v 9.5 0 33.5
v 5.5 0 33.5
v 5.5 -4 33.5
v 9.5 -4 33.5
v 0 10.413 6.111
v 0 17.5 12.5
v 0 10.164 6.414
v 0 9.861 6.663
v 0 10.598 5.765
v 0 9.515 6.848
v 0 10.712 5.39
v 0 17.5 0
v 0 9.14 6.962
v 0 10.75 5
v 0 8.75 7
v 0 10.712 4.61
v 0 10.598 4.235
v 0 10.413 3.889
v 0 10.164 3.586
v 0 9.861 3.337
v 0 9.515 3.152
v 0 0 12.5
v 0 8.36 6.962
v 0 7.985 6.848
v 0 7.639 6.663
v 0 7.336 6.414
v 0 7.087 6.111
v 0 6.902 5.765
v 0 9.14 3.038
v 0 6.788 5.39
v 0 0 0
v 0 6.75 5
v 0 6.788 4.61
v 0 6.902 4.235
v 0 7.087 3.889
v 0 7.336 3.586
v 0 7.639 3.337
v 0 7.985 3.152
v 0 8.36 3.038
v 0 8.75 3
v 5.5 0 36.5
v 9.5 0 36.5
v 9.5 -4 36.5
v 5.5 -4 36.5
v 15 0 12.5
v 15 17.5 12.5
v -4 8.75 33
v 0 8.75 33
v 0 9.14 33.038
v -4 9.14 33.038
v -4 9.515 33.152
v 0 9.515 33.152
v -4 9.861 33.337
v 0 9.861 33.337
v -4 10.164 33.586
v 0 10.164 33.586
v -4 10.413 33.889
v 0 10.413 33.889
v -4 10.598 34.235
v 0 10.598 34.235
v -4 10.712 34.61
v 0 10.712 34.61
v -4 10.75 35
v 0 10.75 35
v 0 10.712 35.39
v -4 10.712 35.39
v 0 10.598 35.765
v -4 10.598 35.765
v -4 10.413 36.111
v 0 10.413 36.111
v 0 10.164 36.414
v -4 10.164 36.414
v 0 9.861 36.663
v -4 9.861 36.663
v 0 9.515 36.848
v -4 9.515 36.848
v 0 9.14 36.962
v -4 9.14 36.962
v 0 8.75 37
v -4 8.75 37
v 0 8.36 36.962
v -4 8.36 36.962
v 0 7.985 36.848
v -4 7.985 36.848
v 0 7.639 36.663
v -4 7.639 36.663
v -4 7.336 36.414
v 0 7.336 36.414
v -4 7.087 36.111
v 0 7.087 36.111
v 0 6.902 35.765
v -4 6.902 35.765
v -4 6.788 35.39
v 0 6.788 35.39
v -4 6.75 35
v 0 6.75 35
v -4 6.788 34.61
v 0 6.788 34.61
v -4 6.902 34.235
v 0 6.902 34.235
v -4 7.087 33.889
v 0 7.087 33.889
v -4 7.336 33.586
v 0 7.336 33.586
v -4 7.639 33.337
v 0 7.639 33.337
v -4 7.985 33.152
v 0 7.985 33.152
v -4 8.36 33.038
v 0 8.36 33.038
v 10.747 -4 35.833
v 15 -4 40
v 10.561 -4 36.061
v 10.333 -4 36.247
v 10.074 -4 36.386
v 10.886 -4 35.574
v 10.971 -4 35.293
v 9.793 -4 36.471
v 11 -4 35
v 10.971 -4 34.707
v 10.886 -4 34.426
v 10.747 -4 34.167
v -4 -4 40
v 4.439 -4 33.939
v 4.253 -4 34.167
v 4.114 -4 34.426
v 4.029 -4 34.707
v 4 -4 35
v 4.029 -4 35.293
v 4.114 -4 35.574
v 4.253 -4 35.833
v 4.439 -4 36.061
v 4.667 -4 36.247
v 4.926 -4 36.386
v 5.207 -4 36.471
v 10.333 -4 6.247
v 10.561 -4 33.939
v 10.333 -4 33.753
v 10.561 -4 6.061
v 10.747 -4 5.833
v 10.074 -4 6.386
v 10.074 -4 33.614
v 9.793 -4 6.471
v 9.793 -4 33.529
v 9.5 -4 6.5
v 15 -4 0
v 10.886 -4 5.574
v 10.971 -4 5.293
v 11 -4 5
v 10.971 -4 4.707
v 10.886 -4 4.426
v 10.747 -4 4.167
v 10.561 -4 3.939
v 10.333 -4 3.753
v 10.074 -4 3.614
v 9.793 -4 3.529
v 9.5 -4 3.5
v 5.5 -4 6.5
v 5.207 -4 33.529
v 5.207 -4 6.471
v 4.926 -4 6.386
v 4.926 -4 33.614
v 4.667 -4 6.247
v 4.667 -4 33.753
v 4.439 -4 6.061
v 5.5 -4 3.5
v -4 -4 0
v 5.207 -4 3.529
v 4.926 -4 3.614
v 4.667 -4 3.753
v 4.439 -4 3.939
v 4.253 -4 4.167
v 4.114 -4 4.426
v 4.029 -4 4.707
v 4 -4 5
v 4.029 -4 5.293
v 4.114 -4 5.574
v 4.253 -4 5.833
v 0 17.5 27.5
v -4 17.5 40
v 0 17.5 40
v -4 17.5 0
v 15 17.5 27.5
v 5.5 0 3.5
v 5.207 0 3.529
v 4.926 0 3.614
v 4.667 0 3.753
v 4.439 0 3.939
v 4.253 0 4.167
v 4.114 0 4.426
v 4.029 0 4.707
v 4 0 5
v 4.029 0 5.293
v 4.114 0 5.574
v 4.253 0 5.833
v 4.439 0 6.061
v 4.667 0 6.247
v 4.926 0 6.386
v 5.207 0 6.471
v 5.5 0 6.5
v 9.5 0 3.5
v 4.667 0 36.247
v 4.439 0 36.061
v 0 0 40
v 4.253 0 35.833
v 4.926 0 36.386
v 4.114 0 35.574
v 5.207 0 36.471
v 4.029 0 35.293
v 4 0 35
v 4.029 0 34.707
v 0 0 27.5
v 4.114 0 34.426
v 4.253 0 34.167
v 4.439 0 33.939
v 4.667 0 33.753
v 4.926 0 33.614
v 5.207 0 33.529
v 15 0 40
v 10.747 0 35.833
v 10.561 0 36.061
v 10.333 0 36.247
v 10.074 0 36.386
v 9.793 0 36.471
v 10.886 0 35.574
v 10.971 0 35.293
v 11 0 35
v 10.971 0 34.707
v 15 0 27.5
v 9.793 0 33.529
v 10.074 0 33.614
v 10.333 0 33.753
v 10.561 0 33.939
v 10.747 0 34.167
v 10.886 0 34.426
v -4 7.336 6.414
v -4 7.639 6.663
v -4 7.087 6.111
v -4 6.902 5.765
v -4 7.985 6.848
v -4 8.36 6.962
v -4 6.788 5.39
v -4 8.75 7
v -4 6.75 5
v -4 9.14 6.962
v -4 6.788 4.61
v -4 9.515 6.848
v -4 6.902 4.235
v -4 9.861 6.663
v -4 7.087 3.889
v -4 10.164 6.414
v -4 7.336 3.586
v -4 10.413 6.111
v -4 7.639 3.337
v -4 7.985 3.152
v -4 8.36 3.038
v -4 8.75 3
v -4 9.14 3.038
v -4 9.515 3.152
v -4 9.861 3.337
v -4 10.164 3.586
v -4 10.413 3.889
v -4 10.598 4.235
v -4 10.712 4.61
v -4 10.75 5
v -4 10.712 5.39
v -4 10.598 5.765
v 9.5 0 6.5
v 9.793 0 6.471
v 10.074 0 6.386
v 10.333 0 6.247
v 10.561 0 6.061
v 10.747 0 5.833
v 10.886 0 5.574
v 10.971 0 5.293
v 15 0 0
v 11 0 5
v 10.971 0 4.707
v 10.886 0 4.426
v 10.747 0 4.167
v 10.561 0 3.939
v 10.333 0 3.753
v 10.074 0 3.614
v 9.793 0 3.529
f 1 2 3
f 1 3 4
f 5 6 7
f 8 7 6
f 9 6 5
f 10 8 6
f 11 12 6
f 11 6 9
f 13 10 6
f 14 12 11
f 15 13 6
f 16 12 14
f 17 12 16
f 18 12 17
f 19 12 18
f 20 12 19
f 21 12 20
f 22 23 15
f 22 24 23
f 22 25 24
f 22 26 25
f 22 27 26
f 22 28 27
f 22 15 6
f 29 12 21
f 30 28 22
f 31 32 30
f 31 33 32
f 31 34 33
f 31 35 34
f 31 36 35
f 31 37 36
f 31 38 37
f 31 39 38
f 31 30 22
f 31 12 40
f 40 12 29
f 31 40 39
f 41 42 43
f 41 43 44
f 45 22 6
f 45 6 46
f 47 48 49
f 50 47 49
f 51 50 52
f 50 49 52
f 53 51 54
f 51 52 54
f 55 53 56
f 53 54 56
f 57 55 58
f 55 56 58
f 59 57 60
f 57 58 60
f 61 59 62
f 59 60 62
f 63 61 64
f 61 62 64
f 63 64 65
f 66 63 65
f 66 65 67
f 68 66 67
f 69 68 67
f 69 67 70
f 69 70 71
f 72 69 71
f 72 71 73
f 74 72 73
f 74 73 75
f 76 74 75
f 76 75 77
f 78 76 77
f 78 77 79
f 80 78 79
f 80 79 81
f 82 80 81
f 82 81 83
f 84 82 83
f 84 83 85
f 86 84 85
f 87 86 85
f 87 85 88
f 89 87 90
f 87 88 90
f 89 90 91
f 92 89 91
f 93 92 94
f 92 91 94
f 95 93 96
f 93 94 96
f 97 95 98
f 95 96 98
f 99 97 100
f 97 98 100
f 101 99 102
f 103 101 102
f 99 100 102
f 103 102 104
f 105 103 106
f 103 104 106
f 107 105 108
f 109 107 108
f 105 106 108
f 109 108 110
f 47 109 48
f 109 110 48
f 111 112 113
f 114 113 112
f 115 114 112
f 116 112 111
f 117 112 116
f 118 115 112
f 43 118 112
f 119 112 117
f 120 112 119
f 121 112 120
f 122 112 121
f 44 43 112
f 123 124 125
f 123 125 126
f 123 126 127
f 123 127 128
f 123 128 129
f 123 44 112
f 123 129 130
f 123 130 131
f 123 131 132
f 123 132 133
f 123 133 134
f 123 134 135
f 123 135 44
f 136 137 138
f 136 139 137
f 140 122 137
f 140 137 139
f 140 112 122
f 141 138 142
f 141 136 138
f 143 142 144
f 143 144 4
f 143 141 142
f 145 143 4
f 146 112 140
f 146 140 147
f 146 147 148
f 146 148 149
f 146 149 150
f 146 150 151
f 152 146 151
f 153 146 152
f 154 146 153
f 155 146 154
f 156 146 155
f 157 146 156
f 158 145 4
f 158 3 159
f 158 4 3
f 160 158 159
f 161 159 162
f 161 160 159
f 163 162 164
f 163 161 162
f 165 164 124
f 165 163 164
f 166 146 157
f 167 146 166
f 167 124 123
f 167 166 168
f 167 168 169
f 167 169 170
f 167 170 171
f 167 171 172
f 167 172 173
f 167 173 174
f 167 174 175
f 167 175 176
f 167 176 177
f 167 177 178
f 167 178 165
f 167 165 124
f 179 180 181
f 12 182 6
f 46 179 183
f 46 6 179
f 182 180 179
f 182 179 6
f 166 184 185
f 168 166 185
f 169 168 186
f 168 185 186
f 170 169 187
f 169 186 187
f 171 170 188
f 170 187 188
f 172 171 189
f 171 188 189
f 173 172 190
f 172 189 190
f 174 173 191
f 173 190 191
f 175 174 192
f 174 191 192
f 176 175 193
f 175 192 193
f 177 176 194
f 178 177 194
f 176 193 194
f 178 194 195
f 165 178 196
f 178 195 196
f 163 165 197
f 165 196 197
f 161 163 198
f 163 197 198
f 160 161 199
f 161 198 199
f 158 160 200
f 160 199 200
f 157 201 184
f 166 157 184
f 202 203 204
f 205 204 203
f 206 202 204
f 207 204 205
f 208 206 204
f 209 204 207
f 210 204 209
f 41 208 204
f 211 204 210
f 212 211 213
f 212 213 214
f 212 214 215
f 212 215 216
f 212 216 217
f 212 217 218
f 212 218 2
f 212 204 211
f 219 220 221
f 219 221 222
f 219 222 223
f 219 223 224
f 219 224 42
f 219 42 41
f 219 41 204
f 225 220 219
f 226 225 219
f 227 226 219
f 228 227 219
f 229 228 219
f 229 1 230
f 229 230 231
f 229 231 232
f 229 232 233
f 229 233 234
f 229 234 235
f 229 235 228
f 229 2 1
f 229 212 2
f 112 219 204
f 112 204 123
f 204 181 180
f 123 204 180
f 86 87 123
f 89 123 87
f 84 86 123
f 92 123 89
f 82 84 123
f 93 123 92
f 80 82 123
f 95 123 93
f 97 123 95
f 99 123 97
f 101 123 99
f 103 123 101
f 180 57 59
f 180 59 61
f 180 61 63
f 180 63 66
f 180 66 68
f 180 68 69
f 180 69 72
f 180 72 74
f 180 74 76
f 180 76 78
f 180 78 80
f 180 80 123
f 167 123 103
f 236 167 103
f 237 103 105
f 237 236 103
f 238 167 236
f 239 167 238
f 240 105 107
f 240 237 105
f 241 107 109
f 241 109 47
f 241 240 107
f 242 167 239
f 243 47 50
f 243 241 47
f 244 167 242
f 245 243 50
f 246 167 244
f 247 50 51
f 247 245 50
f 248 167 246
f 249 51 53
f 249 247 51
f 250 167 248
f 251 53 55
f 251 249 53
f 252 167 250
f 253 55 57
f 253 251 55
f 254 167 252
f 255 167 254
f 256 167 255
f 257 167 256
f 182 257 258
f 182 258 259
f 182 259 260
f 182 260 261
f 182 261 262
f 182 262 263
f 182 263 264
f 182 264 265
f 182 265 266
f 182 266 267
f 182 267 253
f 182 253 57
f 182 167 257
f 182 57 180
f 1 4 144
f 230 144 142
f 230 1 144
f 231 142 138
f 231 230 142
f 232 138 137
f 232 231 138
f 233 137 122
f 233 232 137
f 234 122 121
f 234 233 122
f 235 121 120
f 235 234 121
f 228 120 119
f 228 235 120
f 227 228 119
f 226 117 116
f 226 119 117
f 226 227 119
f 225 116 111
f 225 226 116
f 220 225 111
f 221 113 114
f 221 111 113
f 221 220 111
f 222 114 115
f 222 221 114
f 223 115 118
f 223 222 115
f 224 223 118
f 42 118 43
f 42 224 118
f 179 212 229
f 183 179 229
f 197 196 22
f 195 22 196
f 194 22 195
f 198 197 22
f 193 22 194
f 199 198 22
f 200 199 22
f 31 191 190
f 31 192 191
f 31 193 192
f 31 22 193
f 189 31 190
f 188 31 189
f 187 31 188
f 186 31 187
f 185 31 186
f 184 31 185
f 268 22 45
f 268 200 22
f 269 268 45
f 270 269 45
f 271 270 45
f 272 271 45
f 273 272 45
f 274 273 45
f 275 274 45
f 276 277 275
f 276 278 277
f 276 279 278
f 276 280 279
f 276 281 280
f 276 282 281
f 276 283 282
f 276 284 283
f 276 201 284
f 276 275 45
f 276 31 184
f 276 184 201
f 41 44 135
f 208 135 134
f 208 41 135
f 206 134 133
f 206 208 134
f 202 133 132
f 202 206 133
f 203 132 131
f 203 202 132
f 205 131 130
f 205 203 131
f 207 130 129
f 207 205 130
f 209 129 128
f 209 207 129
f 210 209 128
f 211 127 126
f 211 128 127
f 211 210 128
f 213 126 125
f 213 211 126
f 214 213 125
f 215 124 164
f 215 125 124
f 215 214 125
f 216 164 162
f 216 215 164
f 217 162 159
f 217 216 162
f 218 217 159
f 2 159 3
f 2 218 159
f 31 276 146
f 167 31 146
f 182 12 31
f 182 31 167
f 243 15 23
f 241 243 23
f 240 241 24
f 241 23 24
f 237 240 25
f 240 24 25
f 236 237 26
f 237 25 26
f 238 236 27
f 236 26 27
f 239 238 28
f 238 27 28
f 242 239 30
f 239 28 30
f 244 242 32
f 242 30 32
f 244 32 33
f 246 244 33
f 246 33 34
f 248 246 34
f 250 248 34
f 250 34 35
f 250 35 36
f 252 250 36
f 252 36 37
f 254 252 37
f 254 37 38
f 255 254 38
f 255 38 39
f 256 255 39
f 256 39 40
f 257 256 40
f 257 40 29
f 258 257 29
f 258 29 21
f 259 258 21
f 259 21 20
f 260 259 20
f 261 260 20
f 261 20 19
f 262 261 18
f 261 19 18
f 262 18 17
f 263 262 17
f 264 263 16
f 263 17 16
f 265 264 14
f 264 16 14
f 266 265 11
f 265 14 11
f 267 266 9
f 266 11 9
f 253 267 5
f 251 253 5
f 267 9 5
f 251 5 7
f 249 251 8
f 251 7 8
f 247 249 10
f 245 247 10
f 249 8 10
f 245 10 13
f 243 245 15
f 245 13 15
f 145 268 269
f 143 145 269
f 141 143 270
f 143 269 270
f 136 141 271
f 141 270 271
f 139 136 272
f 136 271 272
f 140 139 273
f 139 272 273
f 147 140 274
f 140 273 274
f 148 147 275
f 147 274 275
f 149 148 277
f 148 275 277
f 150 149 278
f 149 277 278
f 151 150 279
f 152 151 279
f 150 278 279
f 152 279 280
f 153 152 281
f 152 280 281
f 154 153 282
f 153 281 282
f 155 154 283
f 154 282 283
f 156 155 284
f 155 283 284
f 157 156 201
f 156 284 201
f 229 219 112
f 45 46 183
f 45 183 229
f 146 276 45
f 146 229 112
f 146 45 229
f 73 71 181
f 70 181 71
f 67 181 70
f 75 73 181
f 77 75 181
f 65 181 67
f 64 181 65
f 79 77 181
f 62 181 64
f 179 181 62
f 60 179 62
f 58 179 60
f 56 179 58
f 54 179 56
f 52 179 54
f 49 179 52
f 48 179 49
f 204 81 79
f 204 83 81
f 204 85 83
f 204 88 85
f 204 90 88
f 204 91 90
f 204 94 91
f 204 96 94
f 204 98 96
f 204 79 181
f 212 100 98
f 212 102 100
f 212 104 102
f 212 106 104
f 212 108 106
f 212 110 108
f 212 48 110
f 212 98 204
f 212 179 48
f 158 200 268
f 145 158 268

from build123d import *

# Parameters (mm, degrees)
EXTRUDE_1_DEPTH     = 40
CUT_EXTRUDE_1_DEPTH = 47.165463282
SKETCH_4_R          = 2
CUT_EXTRUDE_2_DEPTH = 47.165463282
SKETCH_5_W          = 15
SKETCH_5_H          = 15
EXTRUDE_2_DEPTH     = 17.5


with BuildPart() as part:
    # 草图1 → 凸台-拉伸1 (new body)
    with BuildSketch(Plane.XY):
        Polygon((0, 0), (15, 0), (15, -4), (-4, -4), (-4, 17.5), (0, 17.5), align=None)
    extrude(amount=EXTRUDE_1_DEPTH)

    # 草图2 → 切除-拉伸1 (cut, through all)
    with BuildSketch(Plane(origin=(0, 0, 0), x_dir=(1, 0, 0), z_dir=(0, 1, 0))):
        with BuildLine():
            Line((9.5, -36.5), (5.5, -36.5))
            ThreePointArc((5.5, -36.5), (4, -35), (5.5, -33.5))
            Line((5.5, -33.5), (9.5, -33.5))
            ThreePointArc((9.5, -33.5), (11, -35), (9.5, -36.5))
        make_face()
        with BuildLine():
            Line((9.5, -3.5), (5.5, -3.5))
            ThreePointArc((5.5, -3.5), (4, -5), (5.5, -6.5))
            Line((5.5, -6.5), (9.5, -6.5))
            ThreePointArc((9.5, -6.5), (11, -5), (9.5, -3.5))
        make_face()
    extrude(amount=-CUT_EXTRUDE_1_DEPTH, mode=Mode.SUBTRACT)

    # 草图4 → 切除-拉伸2 (cut, through all)
    with BuildSketch(Plane(origin=(0, 0, 0), x_dir=(0, 0, -1), z_dir=(1, 0, 0))):
        with Locations((-35, 8.75)):
            Circle(SKETCH_4_R)
        with Locations(Location((-5, 8.75, 0), (0, 0, 180))):
            Circle(SKETCH_4_R)
    extrude(amount=-CUT_EXTRUDE_2_DEPTH, mode=Mode.SUBTRACT)

    # 草图5 → 凸台-拉伸2 (add)
    with BuildSketch(Plane(origin=(0, 0, 0), x_dir=(1, 0, 0), z_dir=(0, 1, 0))):
        with Locations((7.5, -20)):
            Rectangle(SKETCH_5_W, SKETCH_5_H)
    extrude(amount=EXTRUDE_2_DEPTH)


solid = part.part
